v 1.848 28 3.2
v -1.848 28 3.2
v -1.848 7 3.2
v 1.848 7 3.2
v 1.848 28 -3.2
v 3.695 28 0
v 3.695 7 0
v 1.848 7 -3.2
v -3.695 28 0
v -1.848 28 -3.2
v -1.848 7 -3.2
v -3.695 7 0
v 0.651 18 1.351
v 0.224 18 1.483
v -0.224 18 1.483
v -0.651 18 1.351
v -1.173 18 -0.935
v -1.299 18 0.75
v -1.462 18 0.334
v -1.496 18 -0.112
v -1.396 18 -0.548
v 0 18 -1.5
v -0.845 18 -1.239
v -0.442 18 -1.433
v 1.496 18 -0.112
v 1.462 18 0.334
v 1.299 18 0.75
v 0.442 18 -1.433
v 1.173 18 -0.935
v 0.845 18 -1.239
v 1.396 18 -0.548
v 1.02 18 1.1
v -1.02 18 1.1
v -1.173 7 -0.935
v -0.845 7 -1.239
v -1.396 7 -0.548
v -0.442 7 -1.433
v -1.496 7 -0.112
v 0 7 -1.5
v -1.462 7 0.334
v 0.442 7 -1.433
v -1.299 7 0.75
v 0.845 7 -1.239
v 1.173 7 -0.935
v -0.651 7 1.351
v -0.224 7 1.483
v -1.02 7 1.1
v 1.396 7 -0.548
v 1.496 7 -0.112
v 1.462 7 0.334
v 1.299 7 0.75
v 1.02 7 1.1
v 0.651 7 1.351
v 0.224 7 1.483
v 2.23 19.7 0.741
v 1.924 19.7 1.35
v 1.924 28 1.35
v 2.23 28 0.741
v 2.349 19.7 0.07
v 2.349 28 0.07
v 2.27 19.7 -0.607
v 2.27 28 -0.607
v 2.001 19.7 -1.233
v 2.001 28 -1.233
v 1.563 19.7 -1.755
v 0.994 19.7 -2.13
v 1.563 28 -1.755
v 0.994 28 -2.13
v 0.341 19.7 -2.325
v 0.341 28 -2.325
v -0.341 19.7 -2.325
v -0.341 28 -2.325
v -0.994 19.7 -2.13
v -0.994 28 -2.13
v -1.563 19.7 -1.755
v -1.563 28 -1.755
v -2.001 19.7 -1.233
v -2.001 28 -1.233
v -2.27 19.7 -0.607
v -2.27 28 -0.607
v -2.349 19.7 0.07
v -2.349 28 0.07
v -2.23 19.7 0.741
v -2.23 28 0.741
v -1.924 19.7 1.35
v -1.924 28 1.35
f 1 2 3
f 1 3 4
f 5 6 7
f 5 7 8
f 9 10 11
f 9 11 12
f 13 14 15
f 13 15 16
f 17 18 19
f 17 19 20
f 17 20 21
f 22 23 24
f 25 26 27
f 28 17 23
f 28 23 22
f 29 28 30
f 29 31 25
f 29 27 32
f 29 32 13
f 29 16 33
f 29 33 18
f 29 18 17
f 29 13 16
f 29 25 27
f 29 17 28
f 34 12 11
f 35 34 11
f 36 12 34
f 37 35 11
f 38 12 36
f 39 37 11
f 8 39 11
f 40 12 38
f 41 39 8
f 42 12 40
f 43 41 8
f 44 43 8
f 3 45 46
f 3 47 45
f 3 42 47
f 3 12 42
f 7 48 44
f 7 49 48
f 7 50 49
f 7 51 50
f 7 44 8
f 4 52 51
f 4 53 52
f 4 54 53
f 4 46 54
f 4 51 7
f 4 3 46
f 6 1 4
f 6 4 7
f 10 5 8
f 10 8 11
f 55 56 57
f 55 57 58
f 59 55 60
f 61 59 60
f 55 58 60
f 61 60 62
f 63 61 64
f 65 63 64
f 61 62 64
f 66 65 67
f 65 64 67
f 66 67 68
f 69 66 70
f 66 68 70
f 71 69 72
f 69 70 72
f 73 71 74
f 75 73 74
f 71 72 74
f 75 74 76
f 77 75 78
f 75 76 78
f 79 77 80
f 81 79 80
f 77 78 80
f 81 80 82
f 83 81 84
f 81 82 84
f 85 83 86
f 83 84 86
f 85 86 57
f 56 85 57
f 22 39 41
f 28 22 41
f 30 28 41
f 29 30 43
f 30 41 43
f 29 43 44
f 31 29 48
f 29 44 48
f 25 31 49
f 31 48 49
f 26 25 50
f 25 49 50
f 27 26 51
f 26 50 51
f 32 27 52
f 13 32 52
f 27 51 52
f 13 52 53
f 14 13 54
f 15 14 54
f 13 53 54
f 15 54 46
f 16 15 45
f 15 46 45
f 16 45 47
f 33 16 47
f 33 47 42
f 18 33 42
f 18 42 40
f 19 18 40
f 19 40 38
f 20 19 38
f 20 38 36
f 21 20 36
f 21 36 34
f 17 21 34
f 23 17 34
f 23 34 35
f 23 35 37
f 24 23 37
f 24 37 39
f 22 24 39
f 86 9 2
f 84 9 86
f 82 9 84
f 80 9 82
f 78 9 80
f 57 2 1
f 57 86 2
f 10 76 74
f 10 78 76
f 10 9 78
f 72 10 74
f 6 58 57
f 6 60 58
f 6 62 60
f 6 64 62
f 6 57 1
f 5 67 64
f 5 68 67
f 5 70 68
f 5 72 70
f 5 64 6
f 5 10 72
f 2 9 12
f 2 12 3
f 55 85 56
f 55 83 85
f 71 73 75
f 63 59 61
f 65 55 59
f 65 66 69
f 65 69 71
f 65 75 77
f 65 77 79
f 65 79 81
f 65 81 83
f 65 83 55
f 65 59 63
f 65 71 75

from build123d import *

# Parameters (mm, degrees)
SALIENTE_EXTRUIR1_DEPTH = 28
CORTAR_EXTRUIR1_DEPTH   = 8.3
CROQUIS3_R              = 1.5
CORTAR_EXTRUIR2_DEPTH   = 18
CROQUIS4_R              = 4
CORTAR_EXTRUIR3_DEPTH   = 7


with BuildPart() as part:
    # Croquis1 → Saliente-Extruir1 (new body)
    with BuildSketch(Plane(origin=(0, 0, 0), x_dir=(1, 0, 0), z_dir=(0, 1, 0))):
        Polygon((3.695041723, 0), (1.847520861, 3.2), (-1.847520861, 3.2), (-3.695041723, 0), (-1.847520861, -3.2), (1.847520861, -3.2), align=None)
    extrude(amount=SALIENTE_EXTRUIR1_DEPTH)

    # Croquis2 → Cortar-Extruir1 (cut)
    with BuildSketch(Plane(origin=(0, 28, 0), x_dir=(1, 0, 0), z_dir=(0, 1, 0))):
        with BuildLine():
            Line((-1.923538406, -1.35), (1.923538406, -1.35))
            ThreePointArc((1.923538406, -1.35), (0, 2.35), (-1.923538406, -1.35))
        make_face()
    extrude(amount=-CORTAR_EXTRUIR1_DEPTH, mode=Mode.SUBTRACT)

    # Croquis3 → Cortar-Extruir2 (cut)
    with BuildSketch(Plane(origin=(0, 0, 0), x_dir=(-1, 0, 0), z_dir=(0, -1, 0))):
        with Locations(Location((0, 0, 0), (0, 0, 90))):
            Circle(CROQUIS3_R)
    extrude(amount=-CORTAR_EXTRUIR2_DEPTH, mode=Mode.SUBTRACT)

    # Croquis4 → Cortar-Extruir3 (cut)
    with BuildSketch(Plane.XZ):
        Circle(CROQUIS4_R)
    extrude(amount=-CORTAR_EXTRUIR3_DEPTH, mode=Mode.SUBTRACT)


solid = part.part
